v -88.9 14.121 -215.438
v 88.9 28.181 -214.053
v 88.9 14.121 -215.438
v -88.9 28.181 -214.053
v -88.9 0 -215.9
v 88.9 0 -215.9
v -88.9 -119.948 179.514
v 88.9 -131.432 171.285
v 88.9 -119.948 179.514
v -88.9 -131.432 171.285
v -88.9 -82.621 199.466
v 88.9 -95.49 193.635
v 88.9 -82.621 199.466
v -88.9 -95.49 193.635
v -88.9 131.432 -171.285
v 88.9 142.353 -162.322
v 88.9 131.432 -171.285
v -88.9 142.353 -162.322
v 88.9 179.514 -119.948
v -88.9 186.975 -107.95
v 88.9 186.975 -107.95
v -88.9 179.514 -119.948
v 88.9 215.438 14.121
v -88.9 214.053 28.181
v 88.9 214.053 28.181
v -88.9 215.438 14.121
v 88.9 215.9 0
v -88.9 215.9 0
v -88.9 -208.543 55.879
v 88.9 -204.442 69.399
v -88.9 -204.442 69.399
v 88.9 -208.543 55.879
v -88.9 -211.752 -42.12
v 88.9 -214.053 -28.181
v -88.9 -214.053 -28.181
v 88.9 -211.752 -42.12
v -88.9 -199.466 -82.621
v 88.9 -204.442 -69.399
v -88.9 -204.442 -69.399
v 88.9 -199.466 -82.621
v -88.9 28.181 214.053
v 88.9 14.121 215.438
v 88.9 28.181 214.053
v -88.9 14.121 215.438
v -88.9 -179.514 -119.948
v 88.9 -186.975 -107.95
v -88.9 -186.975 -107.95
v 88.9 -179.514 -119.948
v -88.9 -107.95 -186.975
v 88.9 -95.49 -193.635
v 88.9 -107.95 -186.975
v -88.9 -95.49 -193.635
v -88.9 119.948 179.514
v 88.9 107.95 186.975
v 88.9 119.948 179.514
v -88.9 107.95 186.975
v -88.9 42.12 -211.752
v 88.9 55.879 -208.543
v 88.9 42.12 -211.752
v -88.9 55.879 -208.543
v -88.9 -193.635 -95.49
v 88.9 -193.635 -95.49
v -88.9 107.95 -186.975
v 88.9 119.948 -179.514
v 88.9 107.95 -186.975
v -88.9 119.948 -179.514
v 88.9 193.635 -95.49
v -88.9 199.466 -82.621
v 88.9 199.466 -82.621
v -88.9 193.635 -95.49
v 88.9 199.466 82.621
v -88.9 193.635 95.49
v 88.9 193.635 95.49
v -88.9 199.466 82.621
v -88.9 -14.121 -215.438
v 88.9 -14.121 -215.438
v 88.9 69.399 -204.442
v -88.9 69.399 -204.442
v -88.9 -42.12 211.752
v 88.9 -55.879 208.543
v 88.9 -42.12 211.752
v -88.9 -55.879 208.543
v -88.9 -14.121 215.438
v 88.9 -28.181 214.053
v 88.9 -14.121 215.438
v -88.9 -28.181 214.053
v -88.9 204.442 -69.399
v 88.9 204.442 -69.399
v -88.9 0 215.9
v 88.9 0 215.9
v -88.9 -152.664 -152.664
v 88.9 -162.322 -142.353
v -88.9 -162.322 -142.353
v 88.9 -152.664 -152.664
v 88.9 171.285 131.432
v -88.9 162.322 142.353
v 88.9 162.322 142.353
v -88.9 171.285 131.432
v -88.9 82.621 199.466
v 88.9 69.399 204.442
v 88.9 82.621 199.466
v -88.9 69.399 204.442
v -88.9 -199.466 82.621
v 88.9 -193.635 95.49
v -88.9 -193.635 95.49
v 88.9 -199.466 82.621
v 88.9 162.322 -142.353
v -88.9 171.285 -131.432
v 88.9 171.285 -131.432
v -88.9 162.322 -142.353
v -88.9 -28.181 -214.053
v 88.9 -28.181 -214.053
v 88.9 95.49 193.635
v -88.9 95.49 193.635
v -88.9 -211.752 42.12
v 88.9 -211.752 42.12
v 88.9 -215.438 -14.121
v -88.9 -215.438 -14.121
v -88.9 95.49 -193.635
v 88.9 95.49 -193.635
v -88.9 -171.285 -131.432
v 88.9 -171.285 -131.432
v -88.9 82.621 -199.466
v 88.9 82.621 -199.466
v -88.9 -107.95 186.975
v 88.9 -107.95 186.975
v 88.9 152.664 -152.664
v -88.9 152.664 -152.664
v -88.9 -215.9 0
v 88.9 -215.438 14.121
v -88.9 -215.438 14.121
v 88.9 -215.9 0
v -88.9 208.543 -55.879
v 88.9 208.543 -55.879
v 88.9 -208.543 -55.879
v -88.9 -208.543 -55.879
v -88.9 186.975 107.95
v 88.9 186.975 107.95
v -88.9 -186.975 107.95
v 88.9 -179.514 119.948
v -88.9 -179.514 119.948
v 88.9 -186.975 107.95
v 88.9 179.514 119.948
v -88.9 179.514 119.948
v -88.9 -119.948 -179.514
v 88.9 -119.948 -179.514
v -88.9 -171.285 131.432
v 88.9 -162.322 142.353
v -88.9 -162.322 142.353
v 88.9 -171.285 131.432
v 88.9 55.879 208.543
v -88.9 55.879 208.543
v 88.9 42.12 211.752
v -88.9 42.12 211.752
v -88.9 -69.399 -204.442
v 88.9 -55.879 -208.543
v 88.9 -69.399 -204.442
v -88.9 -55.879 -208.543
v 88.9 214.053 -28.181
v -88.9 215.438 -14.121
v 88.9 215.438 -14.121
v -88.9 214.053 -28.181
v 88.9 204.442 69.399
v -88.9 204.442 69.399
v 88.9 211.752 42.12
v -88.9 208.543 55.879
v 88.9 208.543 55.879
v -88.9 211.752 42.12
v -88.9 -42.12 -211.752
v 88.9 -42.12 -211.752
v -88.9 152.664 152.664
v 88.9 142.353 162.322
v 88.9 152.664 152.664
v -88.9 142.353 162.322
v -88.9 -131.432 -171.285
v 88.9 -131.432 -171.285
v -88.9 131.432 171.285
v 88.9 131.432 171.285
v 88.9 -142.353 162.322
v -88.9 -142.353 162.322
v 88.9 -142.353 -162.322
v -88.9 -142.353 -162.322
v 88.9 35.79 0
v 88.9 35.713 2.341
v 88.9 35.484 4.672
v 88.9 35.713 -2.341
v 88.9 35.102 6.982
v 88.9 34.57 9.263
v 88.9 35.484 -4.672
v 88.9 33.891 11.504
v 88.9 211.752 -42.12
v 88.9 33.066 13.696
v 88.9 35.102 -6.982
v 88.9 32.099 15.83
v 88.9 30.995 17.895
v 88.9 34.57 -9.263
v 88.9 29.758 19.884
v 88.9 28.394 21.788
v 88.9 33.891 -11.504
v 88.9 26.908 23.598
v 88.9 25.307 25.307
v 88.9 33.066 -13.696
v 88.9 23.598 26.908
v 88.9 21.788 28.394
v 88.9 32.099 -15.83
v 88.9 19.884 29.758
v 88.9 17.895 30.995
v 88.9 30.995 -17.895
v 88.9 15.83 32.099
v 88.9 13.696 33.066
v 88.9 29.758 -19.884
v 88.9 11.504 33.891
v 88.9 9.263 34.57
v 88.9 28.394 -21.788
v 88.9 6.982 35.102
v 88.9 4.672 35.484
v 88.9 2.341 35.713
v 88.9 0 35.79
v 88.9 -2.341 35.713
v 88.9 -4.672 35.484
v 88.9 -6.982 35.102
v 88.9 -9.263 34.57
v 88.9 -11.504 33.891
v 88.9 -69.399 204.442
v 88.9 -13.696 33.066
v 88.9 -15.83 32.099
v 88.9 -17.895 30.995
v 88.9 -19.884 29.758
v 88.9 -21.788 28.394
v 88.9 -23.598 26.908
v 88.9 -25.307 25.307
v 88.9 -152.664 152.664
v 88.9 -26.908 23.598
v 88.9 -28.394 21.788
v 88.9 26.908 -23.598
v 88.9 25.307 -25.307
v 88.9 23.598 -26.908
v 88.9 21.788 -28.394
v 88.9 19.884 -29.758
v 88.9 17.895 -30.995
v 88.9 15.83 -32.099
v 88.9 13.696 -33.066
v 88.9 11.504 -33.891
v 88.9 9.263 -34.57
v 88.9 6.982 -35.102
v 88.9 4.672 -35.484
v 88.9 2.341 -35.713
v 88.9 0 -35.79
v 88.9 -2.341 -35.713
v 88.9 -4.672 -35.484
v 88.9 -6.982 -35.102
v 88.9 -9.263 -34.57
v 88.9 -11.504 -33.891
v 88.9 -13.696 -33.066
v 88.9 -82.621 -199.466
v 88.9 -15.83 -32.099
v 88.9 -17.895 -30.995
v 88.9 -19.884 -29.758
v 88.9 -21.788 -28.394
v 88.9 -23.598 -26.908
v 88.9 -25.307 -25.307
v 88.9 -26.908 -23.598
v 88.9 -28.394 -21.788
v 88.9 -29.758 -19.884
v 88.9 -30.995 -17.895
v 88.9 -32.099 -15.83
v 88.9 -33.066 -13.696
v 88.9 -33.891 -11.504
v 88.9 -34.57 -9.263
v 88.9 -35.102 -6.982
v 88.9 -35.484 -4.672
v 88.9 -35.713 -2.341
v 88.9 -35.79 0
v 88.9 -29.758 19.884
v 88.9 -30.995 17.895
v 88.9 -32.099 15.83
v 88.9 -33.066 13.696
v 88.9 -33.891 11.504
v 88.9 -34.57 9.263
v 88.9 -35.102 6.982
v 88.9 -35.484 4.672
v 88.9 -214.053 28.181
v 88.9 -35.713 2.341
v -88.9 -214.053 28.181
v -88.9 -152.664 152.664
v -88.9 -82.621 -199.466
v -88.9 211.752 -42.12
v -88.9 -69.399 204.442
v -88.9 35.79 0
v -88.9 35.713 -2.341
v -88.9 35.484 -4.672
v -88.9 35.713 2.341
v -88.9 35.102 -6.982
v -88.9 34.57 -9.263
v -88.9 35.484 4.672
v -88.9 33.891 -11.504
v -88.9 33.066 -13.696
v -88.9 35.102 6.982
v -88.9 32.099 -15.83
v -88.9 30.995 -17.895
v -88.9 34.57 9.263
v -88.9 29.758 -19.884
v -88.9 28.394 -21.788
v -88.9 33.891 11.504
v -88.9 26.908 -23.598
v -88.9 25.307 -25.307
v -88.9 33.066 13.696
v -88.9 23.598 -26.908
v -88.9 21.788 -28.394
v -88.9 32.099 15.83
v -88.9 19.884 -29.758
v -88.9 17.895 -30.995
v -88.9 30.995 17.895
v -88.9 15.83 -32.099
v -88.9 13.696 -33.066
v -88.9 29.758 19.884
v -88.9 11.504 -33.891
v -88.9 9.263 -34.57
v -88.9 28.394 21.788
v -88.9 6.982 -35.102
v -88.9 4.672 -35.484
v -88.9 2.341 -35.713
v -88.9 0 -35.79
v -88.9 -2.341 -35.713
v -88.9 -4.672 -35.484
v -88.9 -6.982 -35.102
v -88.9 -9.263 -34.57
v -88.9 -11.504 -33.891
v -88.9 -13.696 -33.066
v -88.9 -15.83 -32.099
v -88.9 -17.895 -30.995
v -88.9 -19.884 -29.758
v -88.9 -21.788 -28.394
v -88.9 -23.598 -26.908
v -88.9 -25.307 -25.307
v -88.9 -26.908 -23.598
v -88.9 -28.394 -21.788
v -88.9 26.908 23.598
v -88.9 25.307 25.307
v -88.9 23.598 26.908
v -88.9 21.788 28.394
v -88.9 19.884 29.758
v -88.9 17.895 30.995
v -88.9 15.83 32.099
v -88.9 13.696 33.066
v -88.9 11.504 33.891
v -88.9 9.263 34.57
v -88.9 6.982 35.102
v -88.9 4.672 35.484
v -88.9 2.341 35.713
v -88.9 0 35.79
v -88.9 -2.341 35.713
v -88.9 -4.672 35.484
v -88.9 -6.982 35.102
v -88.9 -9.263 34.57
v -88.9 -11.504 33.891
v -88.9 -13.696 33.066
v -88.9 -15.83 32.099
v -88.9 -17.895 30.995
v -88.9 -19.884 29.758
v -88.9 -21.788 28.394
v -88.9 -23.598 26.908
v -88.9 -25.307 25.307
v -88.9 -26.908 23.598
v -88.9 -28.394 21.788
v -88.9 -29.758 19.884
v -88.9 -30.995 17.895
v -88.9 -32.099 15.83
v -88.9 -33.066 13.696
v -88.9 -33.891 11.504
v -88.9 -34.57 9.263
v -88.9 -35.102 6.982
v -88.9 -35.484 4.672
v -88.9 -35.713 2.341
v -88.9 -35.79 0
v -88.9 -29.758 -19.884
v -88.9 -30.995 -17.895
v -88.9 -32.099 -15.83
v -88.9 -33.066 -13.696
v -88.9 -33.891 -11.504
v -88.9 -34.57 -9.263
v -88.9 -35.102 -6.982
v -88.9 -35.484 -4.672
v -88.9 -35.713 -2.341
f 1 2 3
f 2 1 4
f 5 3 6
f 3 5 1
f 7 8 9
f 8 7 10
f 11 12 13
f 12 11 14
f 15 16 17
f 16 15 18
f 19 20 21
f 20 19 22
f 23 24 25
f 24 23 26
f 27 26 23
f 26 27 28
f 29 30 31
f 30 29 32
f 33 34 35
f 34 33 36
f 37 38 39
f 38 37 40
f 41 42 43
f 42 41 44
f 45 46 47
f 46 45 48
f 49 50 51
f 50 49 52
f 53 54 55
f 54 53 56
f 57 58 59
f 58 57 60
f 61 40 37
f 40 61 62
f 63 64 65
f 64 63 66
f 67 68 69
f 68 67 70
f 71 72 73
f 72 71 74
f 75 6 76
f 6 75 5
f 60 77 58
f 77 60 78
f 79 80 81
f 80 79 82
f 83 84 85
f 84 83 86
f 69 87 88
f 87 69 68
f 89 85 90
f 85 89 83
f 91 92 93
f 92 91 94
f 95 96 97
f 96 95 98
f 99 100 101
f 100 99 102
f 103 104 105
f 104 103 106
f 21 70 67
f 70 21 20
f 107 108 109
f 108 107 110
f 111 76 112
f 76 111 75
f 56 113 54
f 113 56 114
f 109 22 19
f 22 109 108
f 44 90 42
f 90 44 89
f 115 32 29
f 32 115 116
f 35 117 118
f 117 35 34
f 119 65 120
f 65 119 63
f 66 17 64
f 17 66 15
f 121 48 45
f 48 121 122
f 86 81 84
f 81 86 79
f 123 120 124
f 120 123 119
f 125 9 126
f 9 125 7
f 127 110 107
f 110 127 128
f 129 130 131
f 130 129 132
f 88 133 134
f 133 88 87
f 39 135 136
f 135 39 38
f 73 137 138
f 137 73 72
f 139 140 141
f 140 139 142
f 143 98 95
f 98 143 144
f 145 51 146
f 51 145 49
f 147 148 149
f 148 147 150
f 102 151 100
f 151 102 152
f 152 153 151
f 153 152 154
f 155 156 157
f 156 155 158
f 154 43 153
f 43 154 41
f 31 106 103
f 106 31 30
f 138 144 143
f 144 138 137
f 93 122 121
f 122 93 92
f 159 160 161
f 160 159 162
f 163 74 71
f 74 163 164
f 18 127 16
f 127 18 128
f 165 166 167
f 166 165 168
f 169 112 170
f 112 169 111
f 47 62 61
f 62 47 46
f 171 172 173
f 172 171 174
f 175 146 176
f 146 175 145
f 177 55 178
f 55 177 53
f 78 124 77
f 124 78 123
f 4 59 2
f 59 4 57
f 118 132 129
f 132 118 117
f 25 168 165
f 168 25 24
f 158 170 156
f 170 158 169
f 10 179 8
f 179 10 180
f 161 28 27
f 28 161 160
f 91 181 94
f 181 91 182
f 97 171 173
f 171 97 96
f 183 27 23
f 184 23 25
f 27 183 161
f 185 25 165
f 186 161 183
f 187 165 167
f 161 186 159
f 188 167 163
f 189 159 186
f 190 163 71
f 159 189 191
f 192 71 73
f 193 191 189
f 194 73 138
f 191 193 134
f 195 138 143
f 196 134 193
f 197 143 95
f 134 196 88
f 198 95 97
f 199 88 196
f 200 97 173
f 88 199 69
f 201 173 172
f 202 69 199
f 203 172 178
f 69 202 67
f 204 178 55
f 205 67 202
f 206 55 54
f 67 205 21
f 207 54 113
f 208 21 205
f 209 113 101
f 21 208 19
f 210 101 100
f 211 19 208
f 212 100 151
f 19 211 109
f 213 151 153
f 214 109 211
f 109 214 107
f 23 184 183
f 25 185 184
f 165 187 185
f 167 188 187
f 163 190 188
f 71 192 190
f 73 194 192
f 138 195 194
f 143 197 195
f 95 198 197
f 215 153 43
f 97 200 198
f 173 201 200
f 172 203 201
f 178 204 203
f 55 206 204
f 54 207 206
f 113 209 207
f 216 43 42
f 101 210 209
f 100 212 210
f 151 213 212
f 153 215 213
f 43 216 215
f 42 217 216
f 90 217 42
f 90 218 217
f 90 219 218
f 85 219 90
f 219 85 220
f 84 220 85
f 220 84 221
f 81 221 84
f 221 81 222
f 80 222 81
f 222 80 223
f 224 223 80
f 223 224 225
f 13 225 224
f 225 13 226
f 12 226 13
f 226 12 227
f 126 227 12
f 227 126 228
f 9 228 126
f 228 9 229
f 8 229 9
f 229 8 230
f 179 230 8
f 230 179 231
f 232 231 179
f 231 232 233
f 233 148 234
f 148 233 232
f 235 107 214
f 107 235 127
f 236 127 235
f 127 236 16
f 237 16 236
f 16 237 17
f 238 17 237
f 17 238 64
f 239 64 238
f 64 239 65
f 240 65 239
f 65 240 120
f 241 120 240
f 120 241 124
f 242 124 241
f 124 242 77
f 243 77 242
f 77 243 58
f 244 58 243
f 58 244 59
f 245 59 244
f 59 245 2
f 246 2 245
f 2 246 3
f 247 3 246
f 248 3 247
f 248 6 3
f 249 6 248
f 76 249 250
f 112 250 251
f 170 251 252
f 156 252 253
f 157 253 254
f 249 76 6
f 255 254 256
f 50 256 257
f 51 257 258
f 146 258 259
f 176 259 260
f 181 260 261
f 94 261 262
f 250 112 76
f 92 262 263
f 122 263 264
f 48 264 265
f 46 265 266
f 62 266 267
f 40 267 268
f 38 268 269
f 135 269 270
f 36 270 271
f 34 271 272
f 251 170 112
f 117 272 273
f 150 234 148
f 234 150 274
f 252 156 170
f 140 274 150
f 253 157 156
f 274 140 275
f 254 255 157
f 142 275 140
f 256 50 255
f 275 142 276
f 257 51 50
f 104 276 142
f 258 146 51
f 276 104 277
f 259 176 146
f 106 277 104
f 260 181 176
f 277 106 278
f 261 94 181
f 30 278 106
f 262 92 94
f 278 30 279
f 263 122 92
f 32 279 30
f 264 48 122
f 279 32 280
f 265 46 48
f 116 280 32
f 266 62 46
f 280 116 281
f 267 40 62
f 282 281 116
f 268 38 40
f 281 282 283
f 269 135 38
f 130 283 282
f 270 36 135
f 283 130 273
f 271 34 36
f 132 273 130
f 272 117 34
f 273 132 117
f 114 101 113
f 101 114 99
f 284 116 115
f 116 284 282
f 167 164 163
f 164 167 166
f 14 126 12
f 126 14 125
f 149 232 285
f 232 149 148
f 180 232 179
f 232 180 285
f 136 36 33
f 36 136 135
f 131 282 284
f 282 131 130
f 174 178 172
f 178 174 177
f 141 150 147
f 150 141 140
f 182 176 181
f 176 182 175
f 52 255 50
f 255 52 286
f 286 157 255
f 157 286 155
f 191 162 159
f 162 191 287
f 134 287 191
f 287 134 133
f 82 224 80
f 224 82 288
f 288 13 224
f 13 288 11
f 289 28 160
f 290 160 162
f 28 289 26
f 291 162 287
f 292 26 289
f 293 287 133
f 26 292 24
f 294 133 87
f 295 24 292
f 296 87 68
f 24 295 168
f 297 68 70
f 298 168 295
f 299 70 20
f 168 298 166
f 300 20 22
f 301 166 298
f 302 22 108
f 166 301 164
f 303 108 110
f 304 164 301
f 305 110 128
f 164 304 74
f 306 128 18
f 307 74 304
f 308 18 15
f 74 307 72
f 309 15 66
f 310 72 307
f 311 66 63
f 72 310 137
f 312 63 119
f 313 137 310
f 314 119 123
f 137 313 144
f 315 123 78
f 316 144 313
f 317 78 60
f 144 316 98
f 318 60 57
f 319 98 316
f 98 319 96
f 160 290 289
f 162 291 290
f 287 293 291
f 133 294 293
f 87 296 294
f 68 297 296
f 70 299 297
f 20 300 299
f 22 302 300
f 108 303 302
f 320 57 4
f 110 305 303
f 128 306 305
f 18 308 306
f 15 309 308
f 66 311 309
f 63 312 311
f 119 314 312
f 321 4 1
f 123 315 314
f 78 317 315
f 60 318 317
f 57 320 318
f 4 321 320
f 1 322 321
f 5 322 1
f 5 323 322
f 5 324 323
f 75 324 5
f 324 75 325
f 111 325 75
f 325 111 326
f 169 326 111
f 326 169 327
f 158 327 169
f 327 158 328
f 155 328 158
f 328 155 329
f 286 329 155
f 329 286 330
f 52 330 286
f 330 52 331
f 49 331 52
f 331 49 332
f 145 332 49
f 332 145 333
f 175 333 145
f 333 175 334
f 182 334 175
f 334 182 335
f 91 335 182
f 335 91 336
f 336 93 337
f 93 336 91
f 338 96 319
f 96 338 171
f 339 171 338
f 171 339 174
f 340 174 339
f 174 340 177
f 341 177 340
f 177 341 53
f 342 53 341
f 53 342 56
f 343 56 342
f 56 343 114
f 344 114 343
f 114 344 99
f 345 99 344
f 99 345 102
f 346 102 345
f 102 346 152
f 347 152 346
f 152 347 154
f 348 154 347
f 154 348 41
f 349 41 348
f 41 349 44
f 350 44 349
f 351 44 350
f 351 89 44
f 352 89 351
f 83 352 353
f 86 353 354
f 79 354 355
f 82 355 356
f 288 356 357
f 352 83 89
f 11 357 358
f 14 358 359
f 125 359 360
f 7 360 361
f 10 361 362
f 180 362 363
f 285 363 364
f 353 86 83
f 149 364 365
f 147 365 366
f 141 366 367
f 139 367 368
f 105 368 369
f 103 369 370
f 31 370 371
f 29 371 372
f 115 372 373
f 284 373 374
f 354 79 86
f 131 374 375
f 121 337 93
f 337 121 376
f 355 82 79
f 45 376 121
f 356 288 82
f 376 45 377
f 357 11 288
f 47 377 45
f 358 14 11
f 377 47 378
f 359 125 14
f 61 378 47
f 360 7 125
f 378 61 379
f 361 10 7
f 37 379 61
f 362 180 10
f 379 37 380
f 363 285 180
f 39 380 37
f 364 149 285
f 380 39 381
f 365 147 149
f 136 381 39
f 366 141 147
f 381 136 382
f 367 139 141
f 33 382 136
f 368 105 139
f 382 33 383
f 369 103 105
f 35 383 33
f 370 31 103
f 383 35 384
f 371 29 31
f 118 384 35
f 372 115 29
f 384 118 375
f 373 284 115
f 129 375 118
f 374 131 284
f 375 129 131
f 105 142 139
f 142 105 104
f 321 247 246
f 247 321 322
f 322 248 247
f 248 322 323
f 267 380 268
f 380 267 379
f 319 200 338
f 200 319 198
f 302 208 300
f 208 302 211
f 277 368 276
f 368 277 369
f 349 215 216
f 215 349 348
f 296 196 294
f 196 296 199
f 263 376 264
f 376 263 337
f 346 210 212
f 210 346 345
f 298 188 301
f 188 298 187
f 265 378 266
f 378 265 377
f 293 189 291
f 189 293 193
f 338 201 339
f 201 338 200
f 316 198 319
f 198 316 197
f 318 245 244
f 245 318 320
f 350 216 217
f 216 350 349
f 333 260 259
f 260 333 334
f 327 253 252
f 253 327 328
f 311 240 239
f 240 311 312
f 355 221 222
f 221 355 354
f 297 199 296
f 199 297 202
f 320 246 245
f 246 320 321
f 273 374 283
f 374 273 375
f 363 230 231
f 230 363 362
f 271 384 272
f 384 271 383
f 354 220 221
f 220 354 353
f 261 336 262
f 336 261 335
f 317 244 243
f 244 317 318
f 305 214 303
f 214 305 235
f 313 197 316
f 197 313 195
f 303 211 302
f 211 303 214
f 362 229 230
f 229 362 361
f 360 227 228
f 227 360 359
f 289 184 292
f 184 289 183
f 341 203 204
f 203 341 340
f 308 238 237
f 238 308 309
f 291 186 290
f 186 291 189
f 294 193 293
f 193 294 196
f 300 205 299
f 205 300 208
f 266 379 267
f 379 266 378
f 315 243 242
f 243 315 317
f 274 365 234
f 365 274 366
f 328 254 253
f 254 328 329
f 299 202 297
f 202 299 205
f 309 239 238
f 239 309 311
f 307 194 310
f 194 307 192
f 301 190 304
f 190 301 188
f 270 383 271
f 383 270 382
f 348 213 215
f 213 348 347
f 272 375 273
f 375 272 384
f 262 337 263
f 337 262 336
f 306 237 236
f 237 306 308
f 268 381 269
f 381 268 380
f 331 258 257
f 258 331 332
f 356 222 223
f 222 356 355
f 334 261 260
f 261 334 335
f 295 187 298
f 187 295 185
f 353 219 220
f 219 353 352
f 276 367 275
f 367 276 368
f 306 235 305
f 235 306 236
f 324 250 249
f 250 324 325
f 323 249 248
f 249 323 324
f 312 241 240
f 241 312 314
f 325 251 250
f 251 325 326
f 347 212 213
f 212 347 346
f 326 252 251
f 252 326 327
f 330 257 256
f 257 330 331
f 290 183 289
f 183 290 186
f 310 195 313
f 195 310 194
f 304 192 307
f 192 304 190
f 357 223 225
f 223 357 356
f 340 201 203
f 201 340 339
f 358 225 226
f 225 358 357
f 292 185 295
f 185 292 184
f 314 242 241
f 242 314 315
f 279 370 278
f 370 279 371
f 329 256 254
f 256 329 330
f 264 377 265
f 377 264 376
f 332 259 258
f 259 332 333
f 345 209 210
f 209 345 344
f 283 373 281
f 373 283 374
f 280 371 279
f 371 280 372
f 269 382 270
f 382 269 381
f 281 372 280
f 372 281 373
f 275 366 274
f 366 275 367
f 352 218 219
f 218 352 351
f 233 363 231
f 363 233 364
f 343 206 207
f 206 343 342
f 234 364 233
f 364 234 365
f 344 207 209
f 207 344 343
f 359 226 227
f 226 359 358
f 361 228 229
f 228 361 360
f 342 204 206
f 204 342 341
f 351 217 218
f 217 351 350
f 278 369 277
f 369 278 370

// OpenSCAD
// Generated documentary F1 envelope proxy.
// Not manufacturing geometry, not dimensionally validated, not SimReady.
proxy_id = "COMP-FUCHS-37024.013";
$fn = 96;

rim_diameter_mm = 431.8;
rim_width_mm = 177.8;
centre_bore_mm = 71.58;

rotate([0, 90, 0])
difference() {
    cylinder(h = rim_width_mm, d = rim_diameter_mm, center = true);
    cylinder(h = rim_width_mm + 2, d = centre_bore_mm, center = true);
}
